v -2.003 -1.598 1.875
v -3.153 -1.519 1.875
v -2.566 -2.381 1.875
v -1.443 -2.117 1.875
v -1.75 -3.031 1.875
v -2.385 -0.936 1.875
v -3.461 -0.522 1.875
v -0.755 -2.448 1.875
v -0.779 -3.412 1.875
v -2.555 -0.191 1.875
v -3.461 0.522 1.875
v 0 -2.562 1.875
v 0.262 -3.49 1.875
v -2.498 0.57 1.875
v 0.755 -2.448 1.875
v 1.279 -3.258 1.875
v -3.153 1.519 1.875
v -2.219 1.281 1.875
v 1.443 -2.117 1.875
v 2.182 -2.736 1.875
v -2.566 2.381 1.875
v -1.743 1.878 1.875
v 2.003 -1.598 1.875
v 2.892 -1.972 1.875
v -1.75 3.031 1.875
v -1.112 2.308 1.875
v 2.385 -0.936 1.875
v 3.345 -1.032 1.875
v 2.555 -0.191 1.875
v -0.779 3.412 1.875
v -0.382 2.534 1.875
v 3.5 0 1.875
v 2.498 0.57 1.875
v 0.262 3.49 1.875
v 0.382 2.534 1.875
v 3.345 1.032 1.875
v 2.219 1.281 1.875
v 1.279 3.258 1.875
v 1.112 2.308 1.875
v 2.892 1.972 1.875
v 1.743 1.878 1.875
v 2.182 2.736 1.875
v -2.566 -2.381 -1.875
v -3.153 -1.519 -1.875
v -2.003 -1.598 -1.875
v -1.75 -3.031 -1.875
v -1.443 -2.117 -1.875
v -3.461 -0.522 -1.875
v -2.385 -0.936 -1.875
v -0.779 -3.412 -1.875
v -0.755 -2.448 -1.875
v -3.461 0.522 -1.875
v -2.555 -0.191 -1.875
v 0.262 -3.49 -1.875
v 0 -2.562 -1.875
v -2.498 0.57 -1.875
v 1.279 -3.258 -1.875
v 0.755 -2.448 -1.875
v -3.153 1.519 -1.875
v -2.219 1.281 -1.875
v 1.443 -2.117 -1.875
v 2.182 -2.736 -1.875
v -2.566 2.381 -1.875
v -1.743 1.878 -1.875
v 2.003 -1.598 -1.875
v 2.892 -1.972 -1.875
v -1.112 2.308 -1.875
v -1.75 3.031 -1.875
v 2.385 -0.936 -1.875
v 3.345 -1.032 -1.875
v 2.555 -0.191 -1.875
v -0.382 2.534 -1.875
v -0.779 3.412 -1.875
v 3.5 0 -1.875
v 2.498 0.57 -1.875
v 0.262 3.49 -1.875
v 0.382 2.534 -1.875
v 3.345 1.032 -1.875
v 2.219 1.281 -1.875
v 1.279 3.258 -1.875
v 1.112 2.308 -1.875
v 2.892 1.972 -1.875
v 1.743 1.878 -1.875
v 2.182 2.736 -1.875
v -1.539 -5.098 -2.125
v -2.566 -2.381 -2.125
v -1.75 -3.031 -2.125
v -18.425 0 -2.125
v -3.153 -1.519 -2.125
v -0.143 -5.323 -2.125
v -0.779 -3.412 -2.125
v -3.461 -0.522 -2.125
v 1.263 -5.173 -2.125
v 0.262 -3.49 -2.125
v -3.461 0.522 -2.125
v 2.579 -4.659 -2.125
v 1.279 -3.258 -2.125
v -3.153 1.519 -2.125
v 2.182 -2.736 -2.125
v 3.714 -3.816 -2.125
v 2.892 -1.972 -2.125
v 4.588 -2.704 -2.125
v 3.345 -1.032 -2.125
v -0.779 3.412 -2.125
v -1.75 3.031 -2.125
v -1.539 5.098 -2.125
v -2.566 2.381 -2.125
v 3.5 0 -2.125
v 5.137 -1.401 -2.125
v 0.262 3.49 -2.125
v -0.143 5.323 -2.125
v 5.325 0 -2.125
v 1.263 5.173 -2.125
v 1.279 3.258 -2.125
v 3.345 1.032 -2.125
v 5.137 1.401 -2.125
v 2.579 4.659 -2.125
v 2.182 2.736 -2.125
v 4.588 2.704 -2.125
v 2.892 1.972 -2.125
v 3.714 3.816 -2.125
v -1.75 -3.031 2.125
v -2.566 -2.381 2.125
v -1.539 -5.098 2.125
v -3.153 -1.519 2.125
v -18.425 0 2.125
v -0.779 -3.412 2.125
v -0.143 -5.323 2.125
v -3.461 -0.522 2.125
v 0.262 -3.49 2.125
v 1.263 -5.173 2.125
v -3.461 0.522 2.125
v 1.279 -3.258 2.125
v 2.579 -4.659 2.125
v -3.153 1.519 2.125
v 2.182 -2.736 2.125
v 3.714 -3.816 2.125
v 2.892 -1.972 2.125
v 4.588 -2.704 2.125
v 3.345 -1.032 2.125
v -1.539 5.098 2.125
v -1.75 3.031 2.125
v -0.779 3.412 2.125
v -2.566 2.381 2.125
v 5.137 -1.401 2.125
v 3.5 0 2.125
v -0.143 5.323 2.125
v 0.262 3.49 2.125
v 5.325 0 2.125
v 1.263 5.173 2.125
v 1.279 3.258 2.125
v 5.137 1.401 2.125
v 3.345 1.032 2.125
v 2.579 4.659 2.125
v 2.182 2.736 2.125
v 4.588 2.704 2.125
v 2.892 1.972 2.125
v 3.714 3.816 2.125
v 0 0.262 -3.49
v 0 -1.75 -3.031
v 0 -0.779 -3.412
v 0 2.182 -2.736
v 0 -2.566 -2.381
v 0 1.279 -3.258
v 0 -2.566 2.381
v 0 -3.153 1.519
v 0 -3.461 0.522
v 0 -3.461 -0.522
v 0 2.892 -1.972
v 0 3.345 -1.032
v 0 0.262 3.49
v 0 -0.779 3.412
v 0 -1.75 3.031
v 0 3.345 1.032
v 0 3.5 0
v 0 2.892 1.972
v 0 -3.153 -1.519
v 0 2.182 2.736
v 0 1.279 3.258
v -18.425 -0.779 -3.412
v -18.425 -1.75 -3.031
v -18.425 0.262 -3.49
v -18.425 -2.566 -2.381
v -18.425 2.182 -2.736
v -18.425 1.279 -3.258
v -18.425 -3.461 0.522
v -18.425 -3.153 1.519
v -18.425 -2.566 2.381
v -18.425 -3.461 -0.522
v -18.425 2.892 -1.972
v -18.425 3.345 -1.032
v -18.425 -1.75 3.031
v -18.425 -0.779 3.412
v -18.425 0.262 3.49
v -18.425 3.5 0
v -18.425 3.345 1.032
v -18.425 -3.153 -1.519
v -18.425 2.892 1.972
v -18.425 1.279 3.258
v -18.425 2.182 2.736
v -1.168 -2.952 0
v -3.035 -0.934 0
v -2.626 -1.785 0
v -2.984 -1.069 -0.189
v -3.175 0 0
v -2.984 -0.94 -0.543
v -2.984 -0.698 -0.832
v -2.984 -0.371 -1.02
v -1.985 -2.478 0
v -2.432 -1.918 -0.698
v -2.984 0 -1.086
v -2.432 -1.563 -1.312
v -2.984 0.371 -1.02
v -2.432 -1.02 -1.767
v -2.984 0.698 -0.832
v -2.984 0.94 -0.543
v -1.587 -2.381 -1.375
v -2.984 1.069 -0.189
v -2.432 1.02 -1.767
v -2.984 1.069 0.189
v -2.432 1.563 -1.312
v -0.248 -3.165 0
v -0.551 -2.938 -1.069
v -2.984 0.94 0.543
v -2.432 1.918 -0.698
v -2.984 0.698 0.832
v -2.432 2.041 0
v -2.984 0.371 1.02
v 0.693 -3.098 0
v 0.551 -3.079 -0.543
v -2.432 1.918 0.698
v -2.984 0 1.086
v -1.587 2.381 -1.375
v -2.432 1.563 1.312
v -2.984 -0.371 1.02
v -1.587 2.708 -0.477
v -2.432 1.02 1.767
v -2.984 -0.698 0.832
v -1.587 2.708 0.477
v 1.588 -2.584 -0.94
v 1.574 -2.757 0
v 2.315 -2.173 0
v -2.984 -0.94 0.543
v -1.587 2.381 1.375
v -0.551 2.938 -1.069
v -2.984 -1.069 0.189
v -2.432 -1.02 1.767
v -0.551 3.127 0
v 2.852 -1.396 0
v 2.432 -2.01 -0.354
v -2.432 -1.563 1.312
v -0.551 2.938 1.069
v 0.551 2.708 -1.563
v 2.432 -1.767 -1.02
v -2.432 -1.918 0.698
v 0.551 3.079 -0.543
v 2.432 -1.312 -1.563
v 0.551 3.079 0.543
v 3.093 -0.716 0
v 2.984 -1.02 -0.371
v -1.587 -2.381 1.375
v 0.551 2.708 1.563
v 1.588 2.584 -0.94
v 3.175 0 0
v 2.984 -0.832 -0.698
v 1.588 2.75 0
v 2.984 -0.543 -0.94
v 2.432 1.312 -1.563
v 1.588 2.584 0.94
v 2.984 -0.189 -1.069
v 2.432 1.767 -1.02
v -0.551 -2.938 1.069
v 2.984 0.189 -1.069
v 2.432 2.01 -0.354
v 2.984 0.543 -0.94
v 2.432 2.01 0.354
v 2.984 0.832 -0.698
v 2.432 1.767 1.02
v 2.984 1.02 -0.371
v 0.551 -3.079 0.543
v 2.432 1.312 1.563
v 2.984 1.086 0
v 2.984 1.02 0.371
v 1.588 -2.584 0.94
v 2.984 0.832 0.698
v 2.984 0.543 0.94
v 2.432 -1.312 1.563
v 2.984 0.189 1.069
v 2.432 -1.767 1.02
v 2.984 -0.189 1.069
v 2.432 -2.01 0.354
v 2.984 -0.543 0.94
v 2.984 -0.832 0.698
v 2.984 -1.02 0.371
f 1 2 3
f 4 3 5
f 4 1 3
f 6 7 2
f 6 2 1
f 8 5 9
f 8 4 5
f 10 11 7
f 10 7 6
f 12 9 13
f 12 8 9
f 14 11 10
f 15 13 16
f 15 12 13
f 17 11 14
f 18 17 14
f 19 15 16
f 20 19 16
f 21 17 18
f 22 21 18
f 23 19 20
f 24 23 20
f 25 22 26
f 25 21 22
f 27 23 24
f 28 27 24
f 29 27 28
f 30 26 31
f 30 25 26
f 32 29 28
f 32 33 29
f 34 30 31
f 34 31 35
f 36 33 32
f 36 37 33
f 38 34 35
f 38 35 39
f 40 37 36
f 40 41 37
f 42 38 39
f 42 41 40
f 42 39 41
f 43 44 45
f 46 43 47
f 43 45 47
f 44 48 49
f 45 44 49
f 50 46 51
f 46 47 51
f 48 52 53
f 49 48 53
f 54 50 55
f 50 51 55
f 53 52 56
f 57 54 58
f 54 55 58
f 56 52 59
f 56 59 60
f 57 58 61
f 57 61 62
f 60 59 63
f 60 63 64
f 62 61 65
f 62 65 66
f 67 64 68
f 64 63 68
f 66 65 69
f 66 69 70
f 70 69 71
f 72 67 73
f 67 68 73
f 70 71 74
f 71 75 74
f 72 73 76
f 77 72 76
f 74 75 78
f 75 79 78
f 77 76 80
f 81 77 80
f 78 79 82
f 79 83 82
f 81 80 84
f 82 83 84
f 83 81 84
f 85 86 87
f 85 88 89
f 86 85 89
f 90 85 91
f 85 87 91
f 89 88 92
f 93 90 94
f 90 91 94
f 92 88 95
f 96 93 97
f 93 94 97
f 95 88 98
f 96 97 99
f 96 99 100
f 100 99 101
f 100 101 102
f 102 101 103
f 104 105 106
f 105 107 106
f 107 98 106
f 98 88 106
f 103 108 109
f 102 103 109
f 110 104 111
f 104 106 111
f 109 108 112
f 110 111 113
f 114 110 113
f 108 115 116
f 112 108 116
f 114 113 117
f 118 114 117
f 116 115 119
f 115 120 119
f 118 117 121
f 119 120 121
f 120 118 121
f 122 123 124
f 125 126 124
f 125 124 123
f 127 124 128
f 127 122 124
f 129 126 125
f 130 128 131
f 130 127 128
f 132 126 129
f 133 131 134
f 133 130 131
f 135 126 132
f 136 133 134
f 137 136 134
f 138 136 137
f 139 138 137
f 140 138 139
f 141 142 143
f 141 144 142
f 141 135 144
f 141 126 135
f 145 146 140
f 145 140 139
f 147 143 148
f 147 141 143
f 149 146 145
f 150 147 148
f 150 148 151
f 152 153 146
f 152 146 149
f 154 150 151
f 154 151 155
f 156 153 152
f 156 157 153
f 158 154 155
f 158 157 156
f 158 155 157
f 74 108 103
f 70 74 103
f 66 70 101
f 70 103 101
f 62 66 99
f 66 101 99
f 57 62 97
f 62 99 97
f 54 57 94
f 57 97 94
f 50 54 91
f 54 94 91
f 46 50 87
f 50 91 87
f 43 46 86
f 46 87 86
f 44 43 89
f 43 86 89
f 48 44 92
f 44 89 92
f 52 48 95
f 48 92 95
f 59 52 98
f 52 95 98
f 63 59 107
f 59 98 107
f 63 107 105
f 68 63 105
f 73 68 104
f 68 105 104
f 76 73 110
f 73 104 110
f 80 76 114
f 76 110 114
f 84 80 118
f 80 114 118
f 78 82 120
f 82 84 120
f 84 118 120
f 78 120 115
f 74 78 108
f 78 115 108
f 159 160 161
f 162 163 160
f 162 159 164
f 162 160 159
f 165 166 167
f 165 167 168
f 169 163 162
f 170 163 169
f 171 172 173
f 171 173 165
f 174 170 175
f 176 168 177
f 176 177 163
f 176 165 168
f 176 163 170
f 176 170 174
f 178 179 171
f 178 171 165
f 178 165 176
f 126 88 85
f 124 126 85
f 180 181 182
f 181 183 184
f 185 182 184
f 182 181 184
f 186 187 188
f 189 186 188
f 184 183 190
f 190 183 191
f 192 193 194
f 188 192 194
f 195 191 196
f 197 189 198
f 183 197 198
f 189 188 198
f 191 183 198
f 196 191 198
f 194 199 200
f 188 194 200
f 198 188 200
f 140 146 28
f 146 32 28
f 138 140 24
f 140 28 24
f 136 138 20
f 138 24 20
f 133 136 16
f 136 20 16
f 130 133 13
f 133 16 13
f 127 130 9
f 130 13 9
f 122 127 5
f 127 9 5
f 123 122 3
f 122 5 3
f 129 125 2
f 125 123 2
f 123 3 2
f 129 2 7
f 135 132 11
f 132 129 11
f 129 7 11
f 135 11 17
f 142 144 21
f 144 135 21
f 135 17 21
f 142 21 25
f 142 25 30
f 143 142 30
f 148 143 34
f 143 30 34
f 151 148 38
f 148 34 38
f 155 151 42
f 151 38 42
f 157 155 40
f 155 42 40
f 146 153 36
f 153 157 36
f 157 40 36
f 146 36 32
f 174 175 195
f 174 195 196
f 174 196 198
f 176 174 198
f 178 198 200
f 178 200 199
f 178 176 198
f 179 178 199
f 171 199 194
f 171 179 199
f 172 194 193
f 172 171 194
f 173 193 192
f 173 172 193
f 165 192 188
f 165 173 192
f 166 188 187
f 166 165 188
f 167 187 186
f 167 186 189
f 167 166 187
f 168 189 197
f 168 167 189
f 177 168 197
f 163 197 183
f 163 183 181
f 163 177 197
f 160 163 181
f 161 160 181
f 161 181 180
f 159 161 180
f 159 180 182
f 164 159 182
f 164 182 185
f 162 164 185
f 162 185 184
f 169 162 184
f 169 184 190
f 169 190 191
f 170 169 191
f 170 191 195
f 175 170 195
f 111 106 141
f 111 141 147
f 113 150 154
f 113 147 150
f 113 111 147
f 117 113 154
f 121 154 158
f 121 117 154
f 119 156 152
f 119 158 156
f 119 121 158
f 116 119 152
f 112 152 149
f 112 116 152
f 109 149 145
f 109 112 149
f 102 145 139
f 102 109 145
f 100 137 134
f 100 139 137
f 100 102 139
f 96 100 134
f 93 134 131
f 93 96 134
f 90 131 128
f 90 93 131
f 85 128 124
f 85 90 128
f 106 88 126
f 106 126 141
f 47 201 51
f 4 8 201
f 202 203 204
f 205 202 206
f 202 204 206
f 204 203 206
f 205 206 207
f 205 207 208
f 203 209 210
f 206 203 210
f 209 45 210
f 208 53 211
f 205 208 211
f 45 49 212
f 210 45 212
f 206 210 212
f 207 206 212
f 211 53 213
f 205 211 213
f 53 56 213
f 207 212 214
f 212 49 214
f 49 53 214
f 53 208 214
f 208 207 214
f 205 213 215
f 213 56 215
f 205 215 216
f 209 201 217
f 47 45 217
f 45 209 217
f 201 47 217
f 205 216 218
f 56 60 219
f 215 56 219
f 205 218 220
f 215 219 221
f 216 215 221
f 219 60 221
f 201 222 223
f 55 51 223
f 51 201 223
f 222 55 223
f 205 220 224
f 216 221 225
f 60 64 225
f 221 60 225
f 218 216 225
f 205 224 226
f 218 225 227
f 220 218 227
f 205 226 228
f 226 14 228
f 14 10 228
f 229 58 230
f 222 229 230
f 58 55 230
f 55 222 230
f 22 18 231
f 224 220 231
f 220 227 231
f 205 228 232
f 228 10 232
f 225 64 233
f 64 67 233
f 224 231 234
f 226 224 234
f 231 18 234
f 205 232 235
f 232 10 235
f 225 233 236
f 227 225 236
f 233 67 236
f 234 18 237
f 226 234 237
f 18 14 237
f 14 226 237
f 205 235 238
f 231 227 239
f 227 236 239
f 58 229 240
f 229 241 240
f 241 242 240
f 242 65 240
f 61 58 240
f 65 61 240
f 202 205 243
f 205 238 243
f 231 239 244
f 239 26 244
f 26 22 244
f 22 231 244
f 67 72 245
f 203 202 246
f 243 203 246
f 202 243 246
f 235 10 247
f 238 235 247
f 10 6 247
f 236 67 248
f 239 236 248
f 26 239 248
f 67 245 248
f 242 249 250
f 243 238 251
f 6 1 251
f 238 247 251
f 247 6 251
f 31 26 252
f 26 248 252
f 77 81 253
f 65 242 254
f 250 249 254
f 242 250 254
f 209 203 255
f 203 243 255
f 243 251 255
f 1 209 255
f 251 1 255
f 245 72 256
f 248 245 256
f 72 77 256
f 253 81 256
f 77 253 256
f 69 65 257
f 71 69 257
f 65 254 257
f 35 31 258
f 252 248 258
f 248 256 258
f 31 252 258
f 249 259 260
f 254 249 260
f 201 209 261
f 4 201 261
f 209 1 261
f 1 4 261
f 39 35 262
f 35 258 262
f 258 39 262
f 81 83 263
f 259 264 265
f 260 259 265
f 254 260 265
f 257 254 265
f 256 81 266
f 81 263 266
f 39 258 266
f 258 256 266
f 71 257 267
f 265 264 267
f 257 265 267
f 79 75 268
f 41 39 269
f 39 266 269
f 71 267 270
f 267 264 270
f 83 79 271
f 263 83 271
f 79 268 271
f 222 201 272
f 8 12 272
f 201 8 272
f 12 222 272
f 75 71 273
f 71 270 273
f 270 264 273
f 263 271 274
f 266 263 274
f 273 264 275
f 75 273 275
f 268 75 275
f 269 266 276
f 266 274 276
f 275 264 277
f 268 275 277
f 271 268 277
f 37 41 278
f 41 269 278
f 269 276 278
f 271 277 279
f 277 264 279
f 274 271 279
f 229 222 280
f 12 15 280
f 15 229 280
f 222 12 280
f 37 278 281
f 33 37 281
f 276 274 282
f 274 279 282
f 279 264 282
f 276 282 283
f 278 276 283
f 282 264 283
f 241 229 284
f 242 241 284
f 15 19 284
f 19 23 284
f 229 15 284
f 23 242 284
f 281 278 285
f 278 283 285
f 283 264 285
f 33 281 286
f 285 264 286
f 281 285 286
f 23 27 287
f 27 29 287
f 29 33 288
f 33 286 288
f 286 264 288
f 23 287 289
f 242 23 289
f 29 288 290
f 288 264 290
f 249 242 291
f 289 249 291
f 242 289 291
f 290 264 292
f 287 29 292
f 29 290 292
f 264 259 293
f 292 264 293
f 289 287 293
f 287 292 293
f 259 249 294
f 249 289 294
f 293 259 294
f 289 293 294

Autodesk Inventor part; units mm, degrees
ref_plane "YZ Plane" through (0, 0, 0) normal (1, 0, 0) x (0, 1, 0)
ref_plane "XZ Plane" through (0, 0, 0) normal (0, 1, 0) x (-1, 0, 0)
ref_plane "XY Plane" through (0, 0, 0) normal (0, 0, 1) x (1, 0, 0)
sketch "Sketch1" plane through (0, 0, 0) normal (0, 0, 1) x (1, 0, 0)
  arc A0 (-1.539, -5.0978) -> (-1.539, 5.0978) centre (0, 0) ccw
  line L0 (-18.425, 0) -> (-1.539, -5.0978)
  line L1 (-18.425, 0) -> (-1.539, 5.0978)
  circle A1 centre (0, 0) radius 3.5
  dimension "d0" = 10.65
  dimension "d2" = 7
extrude "Extrusion1" add sketch "Sketch1" along normal mid plane 4.25
sketch "Sketch2" plane through (0, 0, 0) normal (0, 0, 1) x (1, 0, 0)
  circle A0 centre (0, 0) radius 3.5
  dimension "d5" = 7
extrude "Extrusion2" add sketch "Sketch2" along normal mid plane 3.75
sketch "Sketch3" plane through (0, 0, 0) normal (0, 0, 1) x (1, 0, 0)
  circle A0 centre (0, 0) radius 3.175
  line L0 (0, 0) -> (0, -3.7497)
  line L1 (0, -3.7497) -> (0, 0)
  line L2 (0, -0.8126) -> (0, 3.6567)
  line L3 (3.175, 0) -> (-3.175, 0)
  dimension "d8" = 6.35
revolve "Revolution1" cut sketch "Sketch3" angle 360 about axis through (3.175, 0, 0) along (-1, 0, 0) contours A0 L0 L3 | A0 L3 L0
sketch "Sketch4" plane through (0, 0, 0) normal (1, 0, 0) x (0, 1, 0)
  circle A0 centre (0, 0) radius 3.5
  dimension "d10" = 7
extrude "Extrusion3" add sketch "Sketch4" against normal up to surface (18.425 mm away) separate body
